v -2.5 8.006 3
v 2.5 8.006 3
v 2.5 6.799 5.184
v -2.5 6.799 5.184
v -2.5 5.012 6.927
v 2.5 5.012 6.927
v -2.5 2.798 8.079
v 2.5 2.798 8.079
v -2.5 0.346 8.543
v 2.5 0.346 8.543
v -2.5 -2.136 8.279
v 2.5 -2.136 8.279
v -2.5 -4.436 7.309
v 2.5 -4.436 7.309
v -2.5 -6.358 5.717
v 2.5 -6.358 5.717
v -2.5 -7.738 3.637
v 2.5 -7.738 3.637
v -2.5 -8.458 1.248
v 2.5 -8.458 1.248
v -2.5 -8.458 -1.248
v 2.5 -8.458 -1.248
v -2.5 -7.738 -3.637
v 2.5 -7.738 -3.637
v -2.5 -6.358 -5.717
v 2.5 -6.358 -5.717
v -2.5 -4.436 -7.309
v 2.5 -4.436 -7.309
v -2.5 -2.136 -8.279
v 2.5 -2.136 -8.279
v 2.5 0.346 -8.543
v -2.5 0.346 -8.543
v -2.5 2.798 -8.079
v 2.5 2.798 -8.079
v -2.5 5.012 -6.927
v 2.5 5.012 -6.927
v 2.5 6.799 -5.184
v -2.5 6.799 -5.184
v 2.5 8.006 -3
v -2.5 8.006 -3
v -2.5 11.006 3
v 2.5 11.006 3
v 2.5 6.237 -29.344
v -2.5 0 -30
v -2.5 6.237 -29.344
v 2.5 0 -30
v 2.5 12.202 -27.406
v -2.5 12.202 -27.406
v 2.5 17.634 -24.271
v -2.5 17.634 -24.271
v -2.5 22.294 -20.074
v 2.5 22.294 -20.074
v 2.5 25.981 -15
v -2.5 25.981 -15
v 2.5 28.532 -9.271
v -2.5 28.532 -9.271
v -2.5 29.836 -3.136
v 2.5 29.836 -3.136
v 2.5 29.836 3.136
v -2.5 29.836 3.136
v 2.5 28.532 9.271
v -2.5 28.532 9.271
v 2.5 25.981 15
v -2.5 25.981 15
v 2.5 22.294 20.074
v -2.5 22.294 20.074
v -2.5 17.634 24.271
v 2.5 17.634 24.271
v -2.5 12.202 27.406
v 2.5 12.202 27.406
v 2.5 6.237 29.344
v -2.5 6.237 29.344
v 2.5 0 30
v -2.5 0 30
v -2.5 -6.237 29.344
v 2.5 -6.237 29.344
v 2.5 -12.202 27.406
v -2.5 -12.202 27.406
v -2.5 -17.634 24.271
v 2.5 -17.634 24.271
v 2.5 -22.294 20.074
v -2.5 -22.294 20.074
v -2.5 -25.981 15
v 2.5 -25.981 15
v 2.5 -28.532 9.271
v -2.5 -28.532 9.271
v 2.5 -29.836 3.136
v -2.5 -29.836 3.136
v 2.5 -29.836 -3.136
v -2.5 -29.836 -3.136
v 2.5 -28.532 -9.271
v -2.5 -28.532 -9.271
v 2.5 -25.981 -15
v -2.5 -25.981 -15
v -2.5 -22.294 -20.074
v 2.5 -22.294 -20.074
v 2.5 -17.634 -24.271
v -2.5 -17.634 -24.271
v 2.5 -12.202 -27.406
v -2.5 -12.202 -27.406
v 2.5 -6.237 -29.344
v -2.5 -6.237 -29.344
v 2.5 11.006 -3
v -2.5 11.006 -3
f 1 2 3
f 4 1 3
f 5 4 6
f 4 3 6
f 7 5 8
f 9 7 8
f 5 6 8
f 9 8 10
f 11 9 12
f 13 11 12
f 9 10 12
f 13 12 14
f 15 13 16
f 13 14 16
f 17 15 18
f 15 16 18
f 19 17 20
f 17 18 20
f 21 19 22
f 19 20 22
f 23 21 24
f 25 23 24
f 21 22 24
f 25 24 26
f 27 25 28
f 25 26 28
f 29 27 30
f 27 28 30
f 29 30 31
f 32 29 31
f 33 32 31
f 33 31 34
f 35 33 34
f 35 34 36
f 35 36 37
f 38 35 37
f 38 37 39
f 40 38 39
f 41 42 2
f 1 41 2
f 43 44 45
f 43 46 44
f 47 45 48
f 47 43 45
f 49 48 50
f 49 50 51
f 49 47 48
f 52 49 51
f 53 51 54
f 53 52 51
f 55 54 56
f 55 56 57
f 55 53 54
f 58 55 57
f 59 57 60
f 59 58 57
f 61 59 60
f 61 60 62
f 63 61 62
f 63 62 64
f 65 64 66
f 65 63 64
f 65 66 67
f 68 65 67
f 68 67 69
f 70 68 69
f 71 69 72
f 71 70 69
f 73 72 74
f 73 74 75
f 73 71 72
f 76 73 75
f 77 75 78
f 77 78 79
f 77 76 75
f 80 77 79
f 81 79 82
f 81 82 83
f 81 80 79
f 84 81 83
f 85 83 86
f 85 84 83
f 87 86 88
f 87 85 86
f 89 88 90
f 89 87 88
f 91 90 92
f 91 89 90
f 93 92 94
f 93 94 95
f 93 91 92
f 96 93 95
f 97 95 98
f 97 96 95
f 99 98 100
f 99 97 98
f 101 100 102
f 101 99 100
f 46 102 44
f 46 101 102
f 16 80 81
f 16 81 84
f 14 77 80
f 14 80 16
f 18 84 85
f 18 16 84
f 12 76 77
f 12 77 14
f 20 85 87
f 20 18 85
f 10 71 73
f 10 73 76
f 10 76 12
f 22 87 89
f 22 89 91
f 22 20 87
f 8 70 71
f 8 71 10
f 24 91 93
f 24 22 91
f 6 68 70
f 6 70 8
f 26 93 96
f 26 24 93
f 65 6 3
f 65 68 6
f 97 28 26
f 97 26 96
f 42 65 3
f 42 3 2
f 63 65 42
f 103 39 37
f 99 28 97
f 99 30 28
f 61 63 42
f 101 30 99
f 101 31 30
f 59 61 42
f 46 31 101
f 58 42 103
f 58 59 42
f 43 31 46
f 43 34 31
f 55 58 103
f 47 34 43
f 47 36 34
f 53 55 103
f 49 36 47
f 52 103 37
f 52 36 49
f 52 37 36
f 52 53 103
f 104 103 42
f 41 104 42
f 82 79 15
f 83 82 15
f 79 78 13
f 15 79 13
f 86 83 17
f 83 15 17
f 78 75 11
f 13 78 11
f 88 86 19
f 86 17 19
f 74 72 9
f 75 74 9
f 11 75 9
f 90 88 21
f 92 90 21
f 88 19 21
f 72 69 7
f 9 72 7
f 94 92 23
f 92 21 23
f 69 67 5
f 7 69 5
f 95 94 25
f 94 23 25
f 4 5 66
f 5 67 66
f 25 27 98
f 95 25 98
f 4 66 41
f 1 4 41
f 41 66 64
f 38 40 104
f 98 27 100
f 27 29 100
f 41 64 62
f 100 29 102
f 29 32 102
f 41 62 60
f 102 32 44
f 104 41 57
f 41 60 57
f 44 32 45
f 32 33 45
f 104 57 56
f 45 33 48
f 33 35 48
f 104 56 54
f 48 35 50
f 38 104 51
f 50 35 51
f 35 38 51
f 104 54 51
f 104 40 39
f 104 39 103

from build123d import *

# Parameters (mm, degrees)
SKETCH1_R           = 30
BOSS_EXTRUDE1_DEPTH = 2.5
CUT_EXTRUDE4_DEPTH  = 43.720018727


with BuildPart() as part:
    # Sketch1 → Boss-Extrude1 (new, symmetric)
    with BuildSketch(Plane(origin=(0, 0, 0), x_dir=(0, 0, -1), z_dir=(1, 0, 0))):
        Circle(SKETCH1_R)
    extrude(amount=BOSS_EXTRUDE1_DEPTH, both=True)

    # Sketch8 → Cut-Extrude4 (cut, through all)
    with BuildSketch(Plane(origin=(2.5, 0, 0), x_dir=(0, 0, -1), z_dir=(1, 0, 0))):
        with BuildLine():
            Line((0, 11.006403687), (-3, 11.006403687))
            Line((-3, 11.006403687), (-3, 8.006403687))
            ThreePointArc((-3, 8.006403687), (0, -8.55), (3, 8.006403687))
            Line((3, 8.006403687), (3, 11.006403687))
            Line((3, 11.006403687), (0, 11.006403687))
        make_face()
    extrude(amount=-CUT_EXTRUDE4_DEPTH, mode=Mode.SUBTRACT)


solid = part.part
